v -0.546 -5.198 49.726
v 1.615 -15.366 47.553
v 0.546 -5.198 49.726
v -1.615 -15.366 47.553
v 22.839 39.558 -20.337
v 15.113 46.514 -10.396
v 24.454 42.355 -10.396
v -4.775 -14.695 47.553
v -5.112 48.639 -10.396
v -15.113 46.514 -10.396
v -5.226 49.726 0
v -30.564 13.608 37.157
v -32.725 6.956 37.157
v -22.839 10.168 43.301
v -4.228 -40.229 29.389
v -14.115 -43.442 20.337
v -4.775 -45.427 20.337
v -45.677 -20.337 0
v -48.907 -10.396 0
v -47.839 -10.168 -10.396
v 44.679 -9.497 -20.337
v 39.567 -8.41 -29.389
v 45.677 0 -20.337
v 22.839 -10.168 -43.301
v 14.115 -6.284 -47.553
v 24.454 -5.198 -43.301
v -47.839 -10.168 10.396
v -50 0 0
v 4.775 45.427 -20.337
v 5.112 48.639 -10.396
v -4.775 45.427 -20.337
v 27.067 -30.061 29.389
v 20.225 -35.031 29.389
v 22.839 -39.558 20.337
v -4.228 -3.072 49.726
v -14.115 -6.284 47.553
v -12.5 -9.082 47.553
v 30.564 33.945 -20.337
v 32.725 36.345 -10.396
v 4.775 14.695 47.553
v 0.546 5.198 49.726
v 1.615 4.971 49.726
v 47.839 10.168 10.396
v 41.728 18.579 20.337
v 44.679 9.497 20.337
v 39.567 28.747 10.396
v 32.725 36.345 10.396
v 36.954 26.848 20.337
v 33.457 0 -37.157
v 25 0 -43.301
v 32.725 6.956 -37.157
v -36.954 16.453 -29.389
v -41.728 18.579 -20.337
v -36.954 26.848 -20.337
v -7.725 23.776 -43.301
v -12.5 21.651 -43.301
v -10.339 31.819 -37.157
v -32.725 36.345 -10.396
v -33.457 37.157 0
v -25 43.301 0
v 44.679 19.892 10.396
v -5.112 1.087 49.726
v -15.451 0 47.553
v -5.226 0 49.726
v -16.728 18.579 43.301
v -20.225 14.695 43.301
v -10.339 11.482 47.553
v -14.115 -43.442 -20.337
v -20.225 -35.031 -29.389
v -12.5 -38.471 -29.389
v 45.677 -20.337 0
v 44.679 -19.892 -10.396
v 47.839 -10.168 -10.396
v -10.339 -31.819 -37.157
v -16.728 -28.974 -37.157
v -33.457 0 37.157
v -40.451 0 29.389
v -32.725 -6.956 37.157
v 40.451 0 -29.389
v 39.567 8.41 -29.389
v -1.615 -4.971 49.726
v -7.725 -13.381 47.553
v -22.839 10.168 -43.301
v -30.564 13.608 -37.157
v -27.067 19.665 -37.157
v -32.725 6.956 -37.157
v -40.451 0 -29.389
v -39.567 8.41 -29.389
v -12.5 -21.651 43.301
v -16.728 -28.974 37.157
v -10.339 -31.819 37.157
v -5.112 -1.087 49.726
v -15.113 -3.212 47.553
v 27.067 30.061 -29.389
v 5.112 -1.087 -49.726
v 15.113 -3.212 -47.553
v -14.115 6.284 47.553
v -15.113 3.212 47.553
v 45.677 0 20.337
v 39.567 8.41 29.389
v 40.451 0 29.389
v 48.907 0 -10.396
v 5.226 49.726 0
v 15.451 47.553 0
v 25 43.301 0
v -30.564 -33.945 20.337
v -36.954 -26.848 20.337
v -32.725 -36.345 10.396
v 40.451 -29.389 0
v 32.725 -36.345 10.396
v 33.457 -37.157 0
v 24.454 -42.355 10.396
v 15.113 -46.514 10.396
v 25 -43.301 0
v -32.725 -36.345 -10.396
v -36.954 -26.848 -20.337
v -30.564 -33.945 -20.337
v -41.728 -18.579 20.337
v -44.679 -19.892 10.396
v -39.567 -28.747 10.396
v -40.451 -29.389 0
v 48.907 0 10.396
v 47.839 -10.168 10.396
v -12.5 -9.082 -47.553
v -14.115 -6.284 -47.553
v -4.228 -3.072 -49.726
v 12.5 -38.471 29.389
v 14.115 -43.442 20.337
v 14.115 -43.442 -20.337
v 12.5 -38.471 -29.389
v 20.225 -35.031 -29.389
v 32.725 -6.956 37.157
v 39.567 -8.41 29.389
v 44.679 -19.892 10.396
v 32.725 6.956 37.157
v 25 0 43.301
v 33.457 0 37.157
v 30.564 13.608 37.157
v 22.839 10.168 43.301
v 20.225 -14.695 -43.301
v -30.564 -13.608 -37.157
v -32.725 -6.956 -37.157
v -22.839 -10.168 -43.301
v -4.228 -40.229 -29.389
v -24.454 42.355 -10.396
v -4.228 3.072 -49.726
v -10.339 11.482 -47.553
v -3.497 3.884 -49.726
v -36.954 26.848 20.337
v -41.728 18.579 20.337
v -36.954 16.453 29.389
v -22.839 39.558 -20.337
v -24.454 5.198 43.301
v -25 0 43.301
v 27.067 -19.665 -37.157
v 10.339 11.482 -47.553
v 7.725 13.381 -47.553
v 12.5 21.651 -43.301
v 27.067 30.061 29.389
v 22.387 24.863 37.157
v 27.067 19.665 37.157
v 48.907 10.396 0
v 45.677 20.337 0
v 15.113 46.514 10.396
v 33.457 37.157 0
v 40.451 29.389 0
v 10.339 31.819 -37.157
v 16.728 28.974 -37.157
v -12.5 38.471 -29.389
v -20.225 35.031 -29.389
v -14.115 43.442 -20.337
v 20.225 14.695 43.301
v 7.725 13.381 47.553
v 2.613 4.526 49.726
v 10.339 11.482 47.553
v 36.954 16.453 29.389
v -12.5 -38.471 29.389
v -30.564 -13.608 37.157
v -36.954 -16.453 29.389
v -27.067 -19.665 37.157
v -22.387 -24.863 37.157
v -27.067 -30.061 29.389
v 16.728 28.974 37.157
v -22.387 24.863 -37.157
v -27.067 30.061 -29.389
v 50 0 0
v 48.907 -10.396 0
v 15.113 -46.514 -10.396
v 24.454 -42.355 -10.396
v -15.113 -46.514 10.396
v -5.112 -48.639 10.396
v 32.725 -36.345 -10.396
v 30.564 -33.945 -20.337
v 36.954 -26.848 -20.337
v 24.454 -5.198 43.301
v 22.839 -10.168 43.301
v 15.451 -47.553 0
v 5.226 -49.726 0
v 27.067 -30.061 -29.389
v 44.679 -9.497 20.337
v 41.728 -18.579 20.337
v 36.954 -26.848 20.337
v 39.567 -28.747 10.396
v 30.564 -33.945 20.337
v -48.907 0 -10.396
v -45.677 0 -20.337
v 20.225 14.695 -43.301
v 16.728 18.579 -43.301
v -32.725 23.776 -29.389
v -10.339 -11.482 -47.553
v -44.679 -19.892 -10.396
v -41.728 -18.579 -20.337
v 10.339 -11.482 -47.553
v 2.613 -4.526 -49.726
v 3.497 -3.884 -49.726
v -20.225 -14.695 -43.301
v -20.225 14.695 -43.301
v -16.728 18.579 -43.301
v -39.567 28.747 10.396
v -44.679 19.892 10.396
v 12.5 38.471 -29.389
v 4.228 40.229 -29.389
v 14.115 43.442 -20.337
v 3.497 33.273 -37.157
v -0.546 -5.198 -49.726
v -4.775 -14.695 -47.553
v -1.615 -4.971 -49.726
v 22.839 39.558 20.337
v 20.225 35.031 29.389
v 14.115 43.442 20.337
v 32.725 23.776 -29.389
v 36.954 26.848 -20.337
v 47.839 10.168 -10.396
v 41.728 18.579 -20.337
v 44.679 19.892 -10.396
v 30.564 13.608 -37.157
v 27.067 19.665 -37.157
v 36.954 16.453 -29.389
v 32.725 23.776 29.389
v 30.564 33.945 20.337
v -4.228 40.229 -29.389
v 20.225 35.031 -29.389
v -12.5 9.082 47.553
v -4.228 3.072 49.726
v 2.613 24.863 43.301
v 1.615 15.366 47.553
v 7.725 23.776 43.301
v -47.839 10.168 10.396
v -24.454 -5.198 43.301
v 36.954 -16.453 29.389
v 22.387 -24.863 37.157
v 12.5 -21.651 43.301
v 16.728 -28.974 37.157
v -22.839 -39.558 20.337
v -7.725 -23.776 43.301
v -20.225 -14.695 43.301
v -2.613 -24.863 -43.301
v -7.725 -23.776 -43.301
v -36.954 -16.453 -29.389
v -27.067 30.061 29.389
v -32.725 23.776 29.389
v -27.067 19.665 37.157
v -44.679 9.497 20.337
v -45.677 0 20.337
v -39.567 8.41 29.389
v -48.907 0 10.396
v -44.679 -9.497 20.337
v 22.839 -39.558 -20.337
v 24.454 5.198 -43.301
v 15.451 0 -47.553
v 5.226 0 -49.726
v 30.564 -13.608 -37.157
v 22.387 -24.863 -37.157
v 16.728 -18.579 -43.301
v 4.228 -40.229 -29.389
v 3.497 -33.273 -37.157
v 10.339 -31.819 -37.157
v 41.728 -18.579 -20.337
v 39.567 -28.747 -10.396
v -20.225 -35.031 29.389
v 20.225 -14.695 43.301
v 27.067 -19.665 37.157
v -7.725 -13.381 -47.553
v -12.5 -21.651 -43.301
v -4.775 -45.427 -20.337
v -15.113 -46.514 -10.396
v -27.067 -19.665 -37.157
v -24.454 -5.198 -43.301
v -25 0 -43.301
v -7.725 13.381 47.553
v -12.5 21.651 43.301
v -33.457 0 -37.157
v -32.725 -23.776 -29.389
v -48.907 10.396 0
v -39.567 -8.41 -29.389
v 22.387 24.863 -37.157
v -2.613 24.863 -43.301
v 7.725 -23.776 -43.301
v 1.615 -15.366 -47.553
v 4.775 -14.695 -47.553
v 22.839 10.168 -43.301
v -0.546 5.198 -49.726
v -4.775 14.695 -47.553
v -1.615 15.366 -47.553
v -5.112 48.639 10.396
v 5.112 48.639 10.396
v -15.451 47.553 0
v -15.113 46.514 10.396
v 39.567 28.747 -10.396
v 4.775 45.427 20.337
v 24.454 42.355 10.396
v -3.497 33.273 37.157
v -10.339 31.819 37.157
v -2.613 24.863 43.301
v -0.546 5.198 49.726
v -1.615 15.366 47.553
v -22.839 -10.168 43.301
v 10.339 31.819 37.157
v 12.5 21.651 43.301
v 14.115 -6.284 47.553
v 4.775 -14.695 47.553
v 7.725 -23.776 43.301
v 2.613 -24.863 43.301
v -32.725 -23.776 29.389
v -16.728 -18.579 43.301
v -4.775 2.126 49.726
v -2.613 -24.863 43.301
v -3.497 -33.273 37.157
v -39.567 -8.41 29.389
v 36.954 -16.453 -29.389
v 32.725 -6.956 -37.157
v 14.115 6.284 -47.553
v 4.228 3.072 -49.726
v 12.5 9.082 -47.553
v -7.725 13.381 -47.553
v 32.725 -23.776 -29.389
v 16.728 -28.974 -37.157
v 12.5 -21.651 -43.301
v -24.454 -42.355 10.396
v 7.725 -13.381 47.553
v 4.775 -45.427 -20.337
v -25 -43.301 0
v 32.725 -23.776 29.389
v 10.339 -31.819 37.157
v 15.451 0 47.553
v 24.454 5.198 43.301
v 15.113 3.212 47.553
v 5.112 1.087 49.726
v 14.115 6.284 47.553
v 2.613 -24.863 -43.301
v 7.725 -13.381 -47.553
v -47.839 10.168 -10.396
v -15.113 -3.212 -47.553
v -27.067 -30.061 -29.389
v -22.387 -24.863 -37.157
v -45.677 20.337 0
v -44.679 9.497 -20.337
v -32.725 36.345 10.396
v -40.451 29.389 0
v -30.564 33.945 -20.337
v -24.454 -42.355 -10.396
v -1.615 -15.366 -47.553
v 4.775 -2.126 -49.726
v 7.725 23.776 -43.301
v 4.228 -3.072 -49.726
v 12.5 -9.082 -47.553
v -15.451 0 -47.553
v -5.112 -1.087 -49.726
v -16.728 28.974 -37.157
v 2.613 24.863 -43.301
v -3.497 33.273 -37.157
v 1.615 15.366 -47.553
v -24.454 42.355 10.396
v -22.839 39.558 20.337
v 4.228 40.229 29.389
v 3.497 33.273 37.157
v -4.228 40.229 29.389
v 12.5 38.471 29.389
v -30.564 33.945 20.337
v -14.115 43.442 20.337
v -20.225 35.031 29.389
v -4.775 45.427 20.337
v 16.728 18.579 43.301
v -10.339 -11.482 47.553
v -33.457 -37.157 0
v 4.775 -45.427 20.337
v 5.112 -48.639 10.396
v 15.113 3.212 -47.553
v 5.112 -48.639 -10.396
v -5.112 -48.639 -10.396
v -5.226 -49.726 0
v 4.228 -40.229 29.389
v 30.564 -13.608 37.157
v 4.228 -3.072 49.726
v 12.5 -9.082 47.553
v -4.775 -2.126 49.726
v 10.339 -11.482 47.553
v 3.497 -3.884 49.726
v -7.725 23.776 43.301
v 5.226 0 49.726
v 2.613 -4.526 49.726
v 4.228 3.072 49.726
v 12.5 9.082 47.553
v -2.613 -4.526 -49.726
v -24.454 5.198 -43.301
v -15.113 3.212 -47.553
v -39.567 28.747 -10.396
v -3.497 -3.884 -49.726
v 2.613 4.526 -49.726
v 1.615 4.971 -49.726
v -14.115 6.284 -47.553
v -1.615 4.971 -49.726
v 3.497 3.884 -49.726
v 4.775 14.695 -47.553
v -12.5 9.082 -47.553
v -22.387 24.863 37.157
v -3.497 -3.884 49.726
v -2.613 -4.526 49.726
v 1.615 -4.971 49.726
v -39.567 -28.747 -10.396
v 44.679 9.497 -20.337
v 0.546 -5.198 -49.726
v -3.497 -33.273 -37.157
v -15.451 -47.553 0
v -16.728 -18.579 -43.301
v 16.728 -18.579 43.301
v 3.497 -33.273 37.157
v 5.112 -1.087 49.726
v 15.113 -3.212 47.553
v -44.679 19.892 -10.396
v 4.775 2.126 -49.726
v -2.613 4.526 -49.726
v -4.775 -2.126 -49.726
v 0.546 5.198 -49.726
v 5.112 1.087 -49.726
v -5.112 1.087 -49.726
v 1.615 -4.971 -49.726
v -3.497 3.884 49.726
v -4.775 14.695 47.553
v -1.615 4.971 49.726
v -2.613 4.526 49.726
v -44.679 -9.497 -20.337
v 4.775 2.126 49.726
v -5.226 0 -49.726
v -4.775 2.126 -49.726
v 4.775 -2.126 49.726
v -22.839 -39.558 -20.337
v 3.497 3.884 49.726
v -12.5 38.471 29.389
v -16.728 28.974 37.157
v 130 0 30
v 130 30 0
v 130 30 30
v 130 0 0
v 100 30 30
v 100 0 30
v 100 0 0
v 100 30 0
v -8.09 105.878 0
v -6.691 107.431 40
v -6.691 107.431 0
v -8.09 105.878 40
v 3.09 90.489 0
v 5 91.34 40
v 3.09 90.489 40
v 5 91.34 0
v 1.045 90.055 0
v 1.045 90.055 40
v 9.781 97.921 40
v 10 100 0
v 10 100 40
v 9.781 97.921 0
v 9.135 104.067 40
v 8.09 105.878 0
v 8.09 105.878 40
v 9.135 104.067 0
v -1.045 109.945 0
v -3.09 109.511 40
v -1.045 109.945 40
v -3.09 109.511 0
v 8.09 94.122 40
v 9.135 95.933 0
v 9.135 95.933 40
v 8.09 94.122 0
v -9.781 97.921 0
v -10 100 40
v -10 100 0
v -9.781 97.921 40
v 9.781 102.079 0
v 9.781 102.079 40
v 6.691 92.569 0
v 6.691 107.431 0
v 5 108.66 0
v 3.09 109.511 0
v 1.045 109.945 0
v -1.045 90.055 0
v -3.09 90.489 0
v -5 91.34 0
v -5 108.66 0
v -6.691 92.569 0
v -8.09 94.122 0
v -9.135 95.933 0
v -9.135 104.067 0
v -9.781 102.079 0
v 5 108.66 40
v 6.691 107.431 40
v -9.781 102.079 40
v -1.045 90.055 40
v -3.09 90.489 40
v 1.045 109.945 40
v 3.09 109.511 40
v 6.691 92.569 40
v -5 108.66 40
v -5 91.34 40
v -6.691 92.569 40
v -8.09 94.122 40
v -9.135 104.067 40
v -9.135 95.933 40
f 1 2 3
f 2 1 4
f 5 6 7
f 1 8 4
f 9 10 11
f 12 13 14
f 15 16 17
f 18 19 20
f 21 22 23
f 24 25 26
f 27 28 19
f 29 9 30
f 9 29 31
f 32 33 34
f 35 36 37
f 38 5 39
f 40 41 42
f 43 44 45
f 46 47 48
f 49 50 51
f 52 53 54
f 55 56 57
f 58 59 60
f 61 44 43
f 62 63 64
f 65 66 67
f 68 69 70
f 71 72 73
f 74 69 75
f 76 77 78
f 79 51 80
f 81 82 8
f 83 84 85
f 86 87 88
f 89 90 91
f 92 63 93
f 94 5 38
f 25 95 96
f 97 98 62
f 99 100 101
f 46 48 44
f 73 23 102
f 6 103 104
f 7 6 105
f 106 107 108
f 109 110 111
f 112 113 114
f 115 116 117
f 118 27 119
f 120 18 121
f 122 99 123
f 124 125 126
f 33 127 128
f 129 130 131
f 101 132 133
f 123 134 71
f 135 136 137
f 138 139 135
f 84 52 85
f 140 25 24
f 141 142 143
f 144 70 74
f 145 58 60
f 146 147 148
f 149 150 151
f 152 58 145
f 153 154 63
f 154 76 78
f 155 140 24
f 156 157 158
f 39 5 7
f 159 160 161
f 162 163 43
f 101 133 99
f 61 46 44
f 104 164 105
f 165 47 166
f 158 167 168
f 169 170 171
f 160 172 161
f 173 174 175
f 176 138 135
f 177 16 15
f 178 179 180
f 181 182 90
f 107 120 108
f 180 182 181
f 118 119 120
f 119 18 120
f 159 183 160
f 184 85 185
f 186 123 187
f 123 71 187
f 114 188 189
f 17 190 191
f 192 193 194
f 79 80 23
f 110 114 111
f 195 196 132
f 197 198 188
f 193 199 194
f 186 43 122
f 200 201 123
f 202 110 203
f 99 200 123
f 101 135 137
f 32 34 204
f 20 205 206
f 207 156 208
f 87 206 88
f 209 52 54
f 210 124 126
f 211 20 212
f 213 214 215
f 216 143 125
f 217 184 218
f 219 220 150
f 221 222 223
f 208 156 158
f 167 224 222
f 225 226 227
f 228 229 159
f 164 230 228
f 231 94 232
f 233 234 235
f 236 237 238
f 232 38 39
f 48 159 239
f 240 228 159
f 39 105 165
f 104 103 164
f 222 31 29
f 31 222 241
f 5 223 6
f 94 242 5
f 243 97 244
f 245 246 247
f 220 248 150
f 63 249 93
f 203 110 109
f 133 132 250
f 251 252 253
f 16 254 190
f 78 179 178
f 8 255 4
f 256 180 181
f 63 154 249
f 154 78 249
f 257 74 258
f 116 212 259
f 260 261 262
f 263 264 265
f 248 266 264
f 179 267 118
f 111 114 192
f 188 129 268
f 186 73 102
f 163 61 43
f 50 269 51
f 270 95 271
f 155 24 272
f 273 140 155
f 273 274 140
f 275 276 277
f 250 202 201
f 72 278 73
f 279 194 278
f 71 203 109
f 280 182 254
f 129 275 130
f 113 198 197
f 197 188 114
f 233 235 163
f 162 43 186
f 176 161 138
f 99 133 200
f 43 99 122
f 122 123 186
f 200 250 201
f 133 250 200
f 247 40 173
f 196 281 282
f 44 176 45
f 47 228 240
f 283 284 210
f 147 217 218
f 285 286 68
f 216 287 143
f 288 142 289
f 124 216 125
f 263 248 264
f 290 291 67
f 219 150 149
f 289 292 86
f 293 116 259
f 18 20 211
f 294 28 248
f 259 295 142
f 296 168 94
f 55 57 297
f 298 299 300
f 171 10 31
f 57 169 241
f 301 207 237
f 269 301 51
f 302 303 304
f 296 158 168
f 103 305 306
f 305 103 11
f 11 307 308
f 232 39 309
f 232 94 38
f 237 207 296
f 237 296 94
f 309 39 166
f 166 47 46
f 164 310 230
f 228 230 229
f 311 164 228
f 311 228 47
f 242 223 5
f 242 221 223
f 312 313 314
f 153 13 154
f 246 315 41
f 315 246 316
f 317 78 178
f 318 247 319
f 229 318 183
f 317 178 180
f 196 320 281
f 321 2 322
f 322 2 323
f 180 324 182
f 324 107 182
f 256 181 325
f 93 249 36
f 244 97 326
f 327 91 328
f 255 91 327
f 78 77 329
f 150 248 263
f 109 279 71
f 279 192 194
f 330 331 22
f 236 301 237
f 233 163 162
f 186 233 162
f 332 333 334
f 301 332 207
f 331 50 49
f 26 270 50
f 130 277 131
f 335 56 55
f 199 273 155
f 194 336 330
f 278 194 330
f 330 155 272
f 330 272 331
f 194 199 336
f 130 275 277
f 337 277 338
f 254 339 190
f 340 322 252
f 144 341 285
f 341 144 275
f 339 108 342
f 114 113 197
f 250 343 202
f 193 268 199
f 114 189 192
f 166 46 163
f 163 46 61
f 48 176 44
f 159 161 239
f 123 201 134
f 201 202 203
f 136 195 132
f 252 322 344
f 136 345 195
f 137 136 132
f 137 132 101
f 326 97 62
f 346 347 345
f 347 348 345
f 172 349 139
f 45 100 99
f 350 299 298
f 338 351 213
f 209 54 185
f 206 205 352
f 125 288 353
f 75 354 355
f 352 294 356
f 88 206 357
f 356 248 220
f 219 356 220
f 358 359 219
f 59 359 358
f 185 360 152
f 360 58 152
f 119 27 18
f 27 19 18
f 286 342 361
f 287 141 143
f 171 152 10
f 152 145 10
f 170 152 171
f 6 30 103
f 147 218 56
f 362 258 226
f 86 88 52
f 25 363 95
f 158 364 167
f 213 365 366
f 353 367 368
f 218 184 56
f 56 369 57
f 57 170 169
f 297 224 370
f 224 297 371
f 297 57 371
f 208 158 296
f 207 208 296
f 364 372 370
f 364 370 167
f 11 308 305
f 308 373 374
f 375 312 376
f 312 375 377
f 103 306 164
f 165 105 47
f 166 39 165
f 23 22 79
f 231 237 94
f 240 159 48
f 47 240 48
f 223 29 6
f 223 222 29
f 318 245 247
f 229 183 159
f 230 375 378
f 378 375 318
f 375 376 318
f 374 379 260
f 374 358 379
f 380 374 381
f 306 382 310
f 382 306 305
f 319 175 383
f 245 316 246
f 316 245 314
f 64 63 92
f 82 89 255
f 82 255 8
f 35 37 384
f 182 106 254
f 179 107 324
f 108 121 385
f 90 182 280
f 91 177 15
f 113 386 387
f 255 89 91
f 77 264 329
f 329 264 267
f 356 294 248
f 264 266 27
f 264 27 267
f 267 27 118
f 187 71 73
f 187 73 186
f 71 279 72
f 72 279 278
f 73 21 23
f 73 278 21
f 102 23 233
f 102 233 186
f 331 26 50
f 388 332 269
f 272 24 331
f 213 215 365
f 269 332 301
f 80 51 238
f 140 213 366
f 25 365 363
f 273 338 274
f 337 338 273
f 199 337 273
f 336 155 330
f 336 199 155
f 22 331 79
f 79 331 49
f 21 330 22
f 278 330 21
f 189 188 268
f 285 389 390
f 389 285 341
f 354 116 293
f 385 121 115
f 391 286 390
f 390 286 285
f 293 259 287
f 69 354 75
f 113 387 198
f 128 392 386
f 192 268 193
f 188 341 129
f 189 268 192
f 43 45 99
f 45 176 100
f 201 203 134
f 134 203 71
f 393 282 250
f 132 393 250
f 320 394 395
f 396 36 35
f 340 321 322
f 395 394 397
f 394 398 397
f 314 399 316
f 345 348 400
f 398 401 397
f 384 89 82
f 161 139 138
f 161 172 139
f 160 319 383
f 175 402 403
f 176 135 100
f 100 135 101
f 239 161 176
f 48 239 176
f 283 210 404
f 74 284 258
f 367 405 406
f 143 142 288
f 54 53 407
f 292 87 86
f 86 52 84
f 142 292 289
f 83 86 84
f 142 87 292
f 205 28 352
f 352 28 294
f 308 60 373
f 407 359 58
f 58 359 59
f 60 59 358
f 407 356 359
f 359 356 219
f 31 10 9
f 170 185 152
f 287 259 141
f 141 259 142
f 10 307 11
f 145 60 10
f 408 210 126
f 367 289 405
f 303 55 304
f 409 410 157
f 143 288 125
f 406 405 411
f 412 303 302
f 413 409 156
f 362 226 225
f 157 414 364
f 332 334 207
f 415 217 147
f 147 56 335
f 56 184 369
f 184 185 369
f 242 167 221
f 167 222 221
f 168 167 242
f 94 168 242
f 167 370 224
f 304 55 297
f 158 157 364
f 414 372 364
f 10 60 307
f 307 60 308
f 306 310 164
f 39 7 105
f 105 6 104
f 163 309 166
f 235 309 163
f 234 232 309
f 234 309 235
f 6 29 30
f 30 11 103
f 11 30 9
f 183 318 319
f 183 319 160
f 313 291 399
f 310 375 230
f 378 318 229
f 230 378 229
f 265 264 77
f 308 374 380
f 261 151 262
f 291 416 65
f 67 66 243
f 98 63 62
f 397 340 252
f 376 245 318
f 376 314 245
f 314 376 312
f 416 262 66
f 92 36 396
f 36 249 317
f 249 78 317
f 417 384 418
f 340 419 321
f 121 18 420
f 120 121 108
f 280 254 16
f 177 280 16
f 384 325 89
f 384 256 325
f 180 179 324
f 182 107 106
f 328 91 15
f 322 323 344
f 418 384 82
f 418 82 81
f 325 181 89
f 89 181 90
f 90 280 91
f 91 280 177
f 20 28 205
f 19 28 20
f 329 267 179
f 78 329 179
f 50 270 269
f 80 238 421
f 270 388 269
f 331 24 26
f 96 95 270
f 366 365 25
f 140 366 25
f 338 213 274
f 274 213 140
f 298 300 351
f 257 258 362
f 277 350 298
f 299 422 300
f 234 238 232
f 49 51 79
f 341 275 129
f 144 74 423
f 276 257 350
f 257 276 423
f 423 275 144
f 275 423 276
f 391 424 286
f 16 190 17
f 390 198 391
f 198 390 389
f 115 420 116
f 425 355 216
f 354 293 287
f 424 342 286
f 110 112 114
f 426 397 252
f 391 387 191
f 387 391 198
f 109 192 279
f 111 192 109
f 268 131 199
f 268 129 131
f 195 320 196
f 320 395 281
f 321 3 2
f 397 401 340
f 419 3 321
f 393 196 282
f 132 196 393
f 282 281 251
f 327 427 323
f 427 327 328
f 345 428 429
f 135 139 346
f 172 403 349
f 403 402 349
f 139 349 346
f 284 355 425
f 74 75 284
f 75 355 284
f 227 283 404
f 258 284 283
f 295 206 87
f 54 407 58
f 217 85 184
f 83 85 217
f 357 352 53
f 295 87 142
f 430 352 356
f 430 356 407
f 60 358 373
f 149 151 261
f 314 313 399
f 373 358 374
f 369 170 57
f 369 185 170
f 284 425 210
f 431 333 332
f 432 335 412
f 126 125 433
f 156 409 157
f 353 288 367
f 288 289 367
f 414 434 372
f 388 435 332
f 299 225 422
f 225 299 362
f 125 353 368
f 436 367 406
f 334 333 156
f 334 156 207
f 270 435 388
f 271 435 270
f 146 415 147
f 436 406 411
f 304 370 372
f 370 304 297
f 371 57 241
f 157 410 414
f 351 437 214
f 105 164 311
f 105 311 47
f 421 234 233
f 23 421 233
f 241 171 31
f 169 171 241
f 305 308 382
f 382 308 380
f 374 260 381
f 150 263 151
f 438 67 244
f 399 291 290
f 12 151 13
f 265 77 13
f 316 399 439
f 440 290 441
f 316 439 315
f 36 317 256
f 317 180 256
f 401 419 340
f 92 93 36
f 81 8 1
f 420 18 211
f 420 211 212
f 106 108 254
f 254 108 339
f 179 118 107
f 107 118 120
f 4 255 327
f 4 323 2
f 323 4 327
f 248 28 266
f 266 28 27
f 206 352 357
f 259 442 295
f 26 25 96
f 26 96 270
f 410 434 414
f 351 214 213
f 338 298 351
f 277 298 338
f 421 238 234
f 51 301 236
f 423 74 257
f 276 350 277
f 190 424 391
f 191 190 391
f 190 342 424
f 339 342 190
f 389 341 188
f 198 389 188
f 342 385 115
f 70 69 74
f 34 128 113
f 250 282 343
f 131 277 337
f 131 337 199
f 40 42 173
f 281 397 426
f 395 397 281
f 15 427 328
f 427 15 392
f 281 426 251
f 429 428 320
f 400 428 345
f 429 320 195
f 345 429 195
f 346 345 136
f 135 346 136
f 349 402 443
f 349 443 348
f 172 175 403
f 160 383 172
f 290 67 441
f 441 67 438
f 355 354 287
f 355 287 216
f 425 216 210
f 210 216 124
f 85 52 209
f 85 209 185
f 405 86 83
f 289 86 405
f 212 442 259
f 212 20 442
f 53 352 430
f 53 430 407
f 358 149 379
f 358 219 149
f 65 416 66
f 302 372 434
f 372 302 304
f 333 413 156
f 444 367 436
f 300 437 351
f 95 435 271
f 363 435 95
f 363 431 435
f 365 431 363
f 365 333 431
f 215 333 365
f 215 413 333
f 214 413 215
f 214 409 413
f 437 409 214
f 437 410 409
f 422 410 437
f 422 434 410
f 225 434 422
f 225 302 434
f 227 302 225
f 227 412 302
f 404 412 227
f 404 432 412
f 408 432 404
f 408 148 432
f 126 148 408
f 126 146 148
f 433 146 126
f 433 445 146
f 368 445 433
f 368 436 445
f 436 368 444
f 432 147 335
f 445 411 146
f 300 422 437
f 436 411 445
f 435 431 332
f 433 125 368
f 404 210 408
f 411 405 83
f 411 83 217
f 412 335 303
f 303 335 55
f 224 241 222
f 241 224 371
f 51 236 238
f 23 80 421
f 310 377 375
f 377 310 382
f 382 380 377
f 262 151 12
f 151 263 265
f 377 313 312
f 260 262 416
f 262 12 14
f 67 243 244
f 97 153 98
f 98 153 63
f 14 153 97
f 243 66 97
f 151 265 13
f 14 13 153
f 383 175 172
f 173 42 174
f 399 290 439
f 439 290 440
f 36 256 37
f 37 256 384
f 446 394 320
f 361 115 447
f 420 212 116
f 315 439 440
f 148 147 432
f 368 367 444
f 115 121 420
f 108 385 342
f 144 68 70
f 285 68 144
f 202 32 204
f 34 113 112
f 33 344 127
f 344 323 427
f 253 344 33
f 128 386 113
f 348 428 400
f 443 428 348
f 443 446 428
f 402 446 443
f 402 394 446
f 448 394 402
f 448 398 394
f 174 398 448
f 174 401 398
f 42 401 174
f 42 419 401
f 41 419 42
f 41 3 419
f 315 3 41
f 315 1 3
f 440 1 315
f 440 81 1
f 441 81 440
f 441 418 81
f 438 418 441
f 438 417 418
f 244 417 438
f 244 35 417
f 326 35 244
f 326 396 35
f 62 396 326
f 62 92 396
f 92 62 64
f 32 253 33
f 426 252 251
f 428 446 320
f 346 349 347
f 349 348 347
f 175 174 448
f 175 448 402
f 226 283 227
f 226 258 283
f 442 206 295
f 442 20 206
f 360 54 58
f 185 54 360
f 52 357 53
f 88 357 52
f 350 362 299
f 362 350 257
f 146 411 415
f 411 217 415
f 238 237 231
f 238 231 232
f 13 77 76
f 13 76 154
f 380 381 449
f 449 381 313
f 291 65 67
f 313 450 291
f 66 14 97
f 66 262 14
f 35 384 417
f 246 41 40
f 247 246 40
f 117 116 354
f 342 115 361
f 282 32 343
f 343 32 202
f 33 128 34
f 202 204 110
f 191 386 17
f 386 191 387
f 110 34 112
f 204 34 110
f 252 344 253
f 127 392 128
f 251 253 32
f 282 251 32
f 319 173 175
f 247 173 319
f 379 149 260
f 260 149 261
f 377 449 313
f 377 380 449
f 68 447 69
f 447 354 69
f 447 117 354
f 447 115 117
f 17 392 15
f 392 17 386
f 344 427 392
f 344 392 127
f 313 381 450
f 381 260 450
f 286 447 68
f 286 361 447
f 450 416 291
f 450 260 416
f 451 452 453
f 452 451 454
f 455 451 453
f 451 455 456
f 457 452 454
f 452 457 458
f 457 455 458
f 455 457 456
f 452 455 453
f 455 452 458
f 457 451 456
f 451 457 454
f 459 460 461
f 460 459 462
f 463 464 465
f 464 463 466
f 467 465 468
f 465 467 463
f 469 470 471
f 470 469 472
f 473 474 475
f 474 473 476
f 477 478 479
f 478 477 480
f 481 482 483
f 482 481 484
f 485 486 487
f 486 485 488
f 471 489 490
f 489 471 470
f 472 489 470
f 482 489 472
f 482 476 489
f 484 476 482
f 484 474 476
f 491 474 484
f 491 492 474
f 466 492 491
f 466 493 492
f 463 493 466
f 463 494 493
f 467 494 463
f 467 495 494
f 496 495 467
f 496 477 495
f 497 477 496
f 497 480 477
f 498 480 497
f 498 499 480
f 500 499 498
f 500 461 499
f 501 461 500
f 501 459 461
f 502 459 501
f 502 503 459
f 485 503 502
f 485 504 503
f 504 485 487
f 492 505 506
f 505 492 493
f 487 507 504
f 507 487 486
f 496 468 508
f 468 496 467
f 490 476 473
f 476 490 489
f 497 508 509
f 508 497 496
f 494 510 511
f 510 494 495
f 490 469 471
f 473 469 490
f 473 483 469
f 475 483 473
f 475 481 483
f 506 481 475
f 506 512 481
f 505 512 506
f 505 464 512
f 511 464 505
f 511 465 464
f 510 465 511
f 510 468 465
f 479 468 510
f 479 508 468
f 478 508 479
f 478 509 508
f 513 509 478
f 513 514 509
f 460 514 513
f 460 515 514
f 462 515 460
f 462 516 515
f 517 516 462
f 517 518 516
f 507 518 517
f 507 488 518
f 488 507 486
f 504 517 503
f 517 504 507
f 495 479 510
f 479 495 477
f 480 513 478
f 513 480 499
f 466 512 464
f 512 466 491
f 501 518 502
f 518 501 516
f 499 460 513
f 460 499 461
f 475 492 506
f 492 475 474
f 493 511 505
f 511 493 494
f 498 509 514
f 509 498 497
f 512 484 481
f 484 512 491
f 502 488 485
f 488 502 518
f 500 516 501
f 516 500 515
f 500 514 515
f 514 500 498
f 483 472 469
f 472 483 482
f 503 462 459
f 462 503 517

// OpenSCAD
union() {
    translate([0, 0, 0]) sphere(r = 50);
    translate([100, 0, 0]) cube([30, 30, 30]);
    translate([0, 100, 0]) cylinder(h = 40, r = 10);
}
